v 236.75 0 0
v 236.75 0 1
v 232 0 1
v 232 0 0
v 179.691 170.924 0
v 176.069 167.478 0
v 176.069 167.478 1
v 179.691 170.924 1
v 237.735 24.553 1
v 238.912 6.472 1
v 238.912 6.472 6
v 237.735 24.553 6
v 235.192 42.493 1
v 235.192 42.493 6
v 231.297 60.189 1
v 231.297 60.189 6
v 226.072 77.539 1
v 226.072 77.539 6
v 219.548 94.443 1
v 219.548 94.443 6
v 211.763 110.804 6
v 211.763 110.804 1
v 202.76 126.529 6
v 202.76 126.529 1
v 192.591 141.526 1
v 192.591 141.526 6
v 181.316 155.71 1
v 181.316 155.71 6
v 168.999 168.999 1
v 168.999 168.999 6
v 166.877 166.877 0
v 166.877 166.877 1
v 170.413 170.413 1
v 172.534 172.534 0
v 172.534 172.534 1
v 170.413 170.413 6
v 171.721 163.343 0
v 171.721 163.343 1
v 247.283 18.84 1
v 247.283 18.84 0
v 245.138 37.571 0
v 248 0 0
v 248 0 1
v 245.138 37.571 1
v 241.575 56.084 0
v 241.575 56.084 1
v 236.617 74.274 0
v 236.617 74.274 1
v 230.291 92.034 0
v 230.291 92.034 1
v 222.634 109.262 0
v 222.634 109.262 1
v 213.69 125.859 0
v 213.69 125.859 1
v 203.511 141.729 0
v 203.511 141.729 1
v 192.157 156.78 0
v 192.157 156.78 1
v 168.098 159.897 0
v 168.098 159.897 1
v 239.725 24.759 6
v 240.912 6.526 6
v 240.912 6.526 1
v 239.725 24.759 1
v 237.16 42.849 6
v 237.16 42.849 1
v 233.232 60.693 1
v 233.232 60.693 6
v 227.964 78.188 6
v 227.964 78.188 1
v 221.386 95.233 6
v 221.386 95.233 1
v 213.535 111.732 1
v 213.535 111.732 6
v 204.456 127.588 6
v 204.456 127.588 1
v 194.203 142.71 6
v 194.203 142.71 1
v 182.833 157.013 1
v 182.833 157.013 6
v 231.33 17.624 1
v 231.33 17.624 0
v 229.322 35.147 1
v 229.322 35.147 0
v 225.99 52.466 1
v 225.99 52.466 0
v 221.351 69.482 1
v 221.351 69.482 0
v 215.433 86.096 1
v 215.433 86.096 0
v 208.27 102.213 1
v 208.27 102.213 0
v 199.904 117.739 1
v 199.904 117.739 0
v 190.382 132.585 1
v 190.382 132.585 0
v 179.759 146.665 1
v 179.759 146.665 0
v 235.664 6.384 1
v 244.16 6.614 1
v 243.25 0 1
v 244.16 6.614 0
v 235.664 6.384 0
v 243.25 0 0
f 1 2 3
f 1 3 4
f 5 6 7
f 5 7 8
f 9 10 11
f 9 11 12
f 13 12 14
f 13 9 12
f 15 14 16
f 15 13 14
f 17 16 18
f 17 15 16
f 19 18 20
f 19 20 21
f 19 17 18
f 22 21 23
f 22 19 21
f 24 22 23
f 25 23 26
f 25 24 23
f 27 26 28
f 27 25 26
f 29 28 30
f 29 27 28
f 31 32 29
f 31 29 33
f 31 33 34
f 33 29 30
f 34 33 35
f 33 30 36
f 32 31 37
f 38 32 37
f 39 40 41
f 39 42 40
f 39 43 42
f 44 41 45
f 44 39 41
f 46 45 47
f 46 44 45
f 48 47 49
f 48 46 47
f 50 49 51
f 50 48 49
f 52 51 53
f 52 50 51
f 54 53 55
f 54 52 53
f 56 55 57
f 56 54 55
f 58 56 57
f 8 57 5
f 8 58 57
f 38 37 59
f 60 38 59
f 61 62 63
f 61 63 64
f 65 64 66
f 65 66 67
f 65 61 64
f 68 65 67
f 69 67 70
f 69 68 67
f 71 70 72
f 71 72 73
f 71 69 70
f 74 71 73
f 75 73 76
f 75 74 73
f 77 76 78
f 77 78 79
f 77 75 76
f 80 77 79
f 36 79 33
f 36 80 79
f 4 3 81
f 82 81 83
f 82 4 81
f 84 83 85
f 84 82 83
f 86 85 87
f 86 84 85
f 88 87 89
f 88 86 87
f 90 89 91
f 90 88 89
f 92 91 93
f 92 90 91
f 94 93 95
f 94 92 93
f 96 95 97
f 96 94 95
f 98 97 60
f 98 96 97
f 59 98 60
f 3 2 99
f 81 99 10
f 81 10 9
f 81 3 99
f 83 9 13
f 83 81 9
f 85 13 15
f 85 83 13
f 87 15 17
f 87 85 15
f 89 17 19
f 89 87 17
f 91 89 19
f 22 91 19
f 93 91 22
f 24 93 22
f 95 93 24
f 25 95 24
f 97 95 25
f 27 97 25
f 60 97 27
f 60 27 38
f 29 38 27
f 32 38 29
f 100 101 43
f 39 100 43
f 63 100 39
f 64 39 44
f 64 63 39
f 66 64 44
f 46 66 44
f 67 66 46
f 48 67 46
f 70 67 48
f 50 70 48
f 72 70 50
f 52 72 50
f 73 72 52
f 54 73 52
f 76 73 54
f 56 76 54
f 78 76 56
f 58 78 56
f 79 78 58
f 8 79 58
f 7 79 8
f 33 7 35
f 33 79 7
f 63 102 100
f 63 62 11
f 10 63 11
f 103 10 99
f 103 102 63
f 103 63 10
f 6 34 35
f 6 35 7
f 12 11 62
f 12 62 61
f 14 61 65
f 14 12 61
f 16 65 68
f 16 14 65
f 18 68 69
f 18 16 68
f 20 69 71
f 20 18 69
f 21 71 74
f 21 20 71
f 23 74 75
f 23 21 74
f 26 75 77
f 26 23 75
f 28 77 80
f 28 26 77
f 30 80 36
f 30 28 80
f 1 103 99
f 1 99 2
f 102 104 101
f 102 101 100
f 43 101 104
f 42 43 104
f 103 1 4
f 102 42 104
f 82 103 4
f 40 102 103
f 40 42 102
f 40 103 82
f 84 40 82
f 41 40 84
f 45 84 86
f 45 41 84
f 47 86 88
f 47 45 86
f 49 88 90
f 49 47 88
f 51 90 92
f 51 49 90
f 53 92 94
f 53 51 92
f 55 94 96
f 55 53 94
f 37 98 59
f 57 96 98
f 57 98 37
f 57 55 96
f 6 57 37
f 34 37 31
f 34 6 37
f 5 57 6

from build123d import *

# Parameters (mm, degrees)
POCKET_DEPTH         = 0.001
POCKET_DEPTH_BACK    = 6.001
POCKET001_DEPTH      = 0.001
POCKET001_DEPTH_BACK = 6.001


with BuildPart() as part:
    # AdditivePipe: sweep along a path in Sketch
    with BuildLine(Plane.XY) as additivepipe_path:
        ThreePointArc((240, 0), (221.731088, 91.844024), (169.705627, 169.705627))
    # Sketch001 → AdditivePipe (sweep)
    with BuildSketch(Plane(origin=(240, 0, 0), x_dir=(1, 0, 0), z_dir=(0, -1, 0))):
        Polygon((-8, 0), (8, 0), (8, 1), (1, 1), (1, 6), (-1, 6), (-1, 1), (-8, 1), align=None)
    sweep(path=additivepipe_path.line, is_frenet=True)

    # Sketch002 → Pocket (cut, two sides)
    with BuildSketch(Plane.XY) as pocket_sk:
        Polygon((235.663538, 6.38431), (236.75, 0), (243.25, 0), (244.16042, 6.614498), align=None)
    extrude(amount=-POCKET_DEPTH, mode=Mode.SUBTRACT)
    extrude(pocket_sk.sketch, amount=POCKET_DEPTH_BACK, mode=Mode.SUBTRACT)

    # Sketch003 → Pocket001 (cut, two sides)
    with BuildSketch(Plane.XY) as pocket001_sk:
        Polygon((166.8772, 166.8772), (171.721217, 163.342657), (155.73217, 148.133741), (152.027958, 152.027958), align=None)
        Polygon((172.534055, 172.534055), (176.06859, 167.477914), (192.057638, 182.68683), (187.383297, 187.383297), align=None)
    extrude(amount=-POCKET001_DEPTH, mode=Mode.SUBTRACT)
    extrude(pocket001_sk.sketch, amount=POCKET001_DEPTH_BACK, mode=Mode.SUBTRACT)


solid = part.part
